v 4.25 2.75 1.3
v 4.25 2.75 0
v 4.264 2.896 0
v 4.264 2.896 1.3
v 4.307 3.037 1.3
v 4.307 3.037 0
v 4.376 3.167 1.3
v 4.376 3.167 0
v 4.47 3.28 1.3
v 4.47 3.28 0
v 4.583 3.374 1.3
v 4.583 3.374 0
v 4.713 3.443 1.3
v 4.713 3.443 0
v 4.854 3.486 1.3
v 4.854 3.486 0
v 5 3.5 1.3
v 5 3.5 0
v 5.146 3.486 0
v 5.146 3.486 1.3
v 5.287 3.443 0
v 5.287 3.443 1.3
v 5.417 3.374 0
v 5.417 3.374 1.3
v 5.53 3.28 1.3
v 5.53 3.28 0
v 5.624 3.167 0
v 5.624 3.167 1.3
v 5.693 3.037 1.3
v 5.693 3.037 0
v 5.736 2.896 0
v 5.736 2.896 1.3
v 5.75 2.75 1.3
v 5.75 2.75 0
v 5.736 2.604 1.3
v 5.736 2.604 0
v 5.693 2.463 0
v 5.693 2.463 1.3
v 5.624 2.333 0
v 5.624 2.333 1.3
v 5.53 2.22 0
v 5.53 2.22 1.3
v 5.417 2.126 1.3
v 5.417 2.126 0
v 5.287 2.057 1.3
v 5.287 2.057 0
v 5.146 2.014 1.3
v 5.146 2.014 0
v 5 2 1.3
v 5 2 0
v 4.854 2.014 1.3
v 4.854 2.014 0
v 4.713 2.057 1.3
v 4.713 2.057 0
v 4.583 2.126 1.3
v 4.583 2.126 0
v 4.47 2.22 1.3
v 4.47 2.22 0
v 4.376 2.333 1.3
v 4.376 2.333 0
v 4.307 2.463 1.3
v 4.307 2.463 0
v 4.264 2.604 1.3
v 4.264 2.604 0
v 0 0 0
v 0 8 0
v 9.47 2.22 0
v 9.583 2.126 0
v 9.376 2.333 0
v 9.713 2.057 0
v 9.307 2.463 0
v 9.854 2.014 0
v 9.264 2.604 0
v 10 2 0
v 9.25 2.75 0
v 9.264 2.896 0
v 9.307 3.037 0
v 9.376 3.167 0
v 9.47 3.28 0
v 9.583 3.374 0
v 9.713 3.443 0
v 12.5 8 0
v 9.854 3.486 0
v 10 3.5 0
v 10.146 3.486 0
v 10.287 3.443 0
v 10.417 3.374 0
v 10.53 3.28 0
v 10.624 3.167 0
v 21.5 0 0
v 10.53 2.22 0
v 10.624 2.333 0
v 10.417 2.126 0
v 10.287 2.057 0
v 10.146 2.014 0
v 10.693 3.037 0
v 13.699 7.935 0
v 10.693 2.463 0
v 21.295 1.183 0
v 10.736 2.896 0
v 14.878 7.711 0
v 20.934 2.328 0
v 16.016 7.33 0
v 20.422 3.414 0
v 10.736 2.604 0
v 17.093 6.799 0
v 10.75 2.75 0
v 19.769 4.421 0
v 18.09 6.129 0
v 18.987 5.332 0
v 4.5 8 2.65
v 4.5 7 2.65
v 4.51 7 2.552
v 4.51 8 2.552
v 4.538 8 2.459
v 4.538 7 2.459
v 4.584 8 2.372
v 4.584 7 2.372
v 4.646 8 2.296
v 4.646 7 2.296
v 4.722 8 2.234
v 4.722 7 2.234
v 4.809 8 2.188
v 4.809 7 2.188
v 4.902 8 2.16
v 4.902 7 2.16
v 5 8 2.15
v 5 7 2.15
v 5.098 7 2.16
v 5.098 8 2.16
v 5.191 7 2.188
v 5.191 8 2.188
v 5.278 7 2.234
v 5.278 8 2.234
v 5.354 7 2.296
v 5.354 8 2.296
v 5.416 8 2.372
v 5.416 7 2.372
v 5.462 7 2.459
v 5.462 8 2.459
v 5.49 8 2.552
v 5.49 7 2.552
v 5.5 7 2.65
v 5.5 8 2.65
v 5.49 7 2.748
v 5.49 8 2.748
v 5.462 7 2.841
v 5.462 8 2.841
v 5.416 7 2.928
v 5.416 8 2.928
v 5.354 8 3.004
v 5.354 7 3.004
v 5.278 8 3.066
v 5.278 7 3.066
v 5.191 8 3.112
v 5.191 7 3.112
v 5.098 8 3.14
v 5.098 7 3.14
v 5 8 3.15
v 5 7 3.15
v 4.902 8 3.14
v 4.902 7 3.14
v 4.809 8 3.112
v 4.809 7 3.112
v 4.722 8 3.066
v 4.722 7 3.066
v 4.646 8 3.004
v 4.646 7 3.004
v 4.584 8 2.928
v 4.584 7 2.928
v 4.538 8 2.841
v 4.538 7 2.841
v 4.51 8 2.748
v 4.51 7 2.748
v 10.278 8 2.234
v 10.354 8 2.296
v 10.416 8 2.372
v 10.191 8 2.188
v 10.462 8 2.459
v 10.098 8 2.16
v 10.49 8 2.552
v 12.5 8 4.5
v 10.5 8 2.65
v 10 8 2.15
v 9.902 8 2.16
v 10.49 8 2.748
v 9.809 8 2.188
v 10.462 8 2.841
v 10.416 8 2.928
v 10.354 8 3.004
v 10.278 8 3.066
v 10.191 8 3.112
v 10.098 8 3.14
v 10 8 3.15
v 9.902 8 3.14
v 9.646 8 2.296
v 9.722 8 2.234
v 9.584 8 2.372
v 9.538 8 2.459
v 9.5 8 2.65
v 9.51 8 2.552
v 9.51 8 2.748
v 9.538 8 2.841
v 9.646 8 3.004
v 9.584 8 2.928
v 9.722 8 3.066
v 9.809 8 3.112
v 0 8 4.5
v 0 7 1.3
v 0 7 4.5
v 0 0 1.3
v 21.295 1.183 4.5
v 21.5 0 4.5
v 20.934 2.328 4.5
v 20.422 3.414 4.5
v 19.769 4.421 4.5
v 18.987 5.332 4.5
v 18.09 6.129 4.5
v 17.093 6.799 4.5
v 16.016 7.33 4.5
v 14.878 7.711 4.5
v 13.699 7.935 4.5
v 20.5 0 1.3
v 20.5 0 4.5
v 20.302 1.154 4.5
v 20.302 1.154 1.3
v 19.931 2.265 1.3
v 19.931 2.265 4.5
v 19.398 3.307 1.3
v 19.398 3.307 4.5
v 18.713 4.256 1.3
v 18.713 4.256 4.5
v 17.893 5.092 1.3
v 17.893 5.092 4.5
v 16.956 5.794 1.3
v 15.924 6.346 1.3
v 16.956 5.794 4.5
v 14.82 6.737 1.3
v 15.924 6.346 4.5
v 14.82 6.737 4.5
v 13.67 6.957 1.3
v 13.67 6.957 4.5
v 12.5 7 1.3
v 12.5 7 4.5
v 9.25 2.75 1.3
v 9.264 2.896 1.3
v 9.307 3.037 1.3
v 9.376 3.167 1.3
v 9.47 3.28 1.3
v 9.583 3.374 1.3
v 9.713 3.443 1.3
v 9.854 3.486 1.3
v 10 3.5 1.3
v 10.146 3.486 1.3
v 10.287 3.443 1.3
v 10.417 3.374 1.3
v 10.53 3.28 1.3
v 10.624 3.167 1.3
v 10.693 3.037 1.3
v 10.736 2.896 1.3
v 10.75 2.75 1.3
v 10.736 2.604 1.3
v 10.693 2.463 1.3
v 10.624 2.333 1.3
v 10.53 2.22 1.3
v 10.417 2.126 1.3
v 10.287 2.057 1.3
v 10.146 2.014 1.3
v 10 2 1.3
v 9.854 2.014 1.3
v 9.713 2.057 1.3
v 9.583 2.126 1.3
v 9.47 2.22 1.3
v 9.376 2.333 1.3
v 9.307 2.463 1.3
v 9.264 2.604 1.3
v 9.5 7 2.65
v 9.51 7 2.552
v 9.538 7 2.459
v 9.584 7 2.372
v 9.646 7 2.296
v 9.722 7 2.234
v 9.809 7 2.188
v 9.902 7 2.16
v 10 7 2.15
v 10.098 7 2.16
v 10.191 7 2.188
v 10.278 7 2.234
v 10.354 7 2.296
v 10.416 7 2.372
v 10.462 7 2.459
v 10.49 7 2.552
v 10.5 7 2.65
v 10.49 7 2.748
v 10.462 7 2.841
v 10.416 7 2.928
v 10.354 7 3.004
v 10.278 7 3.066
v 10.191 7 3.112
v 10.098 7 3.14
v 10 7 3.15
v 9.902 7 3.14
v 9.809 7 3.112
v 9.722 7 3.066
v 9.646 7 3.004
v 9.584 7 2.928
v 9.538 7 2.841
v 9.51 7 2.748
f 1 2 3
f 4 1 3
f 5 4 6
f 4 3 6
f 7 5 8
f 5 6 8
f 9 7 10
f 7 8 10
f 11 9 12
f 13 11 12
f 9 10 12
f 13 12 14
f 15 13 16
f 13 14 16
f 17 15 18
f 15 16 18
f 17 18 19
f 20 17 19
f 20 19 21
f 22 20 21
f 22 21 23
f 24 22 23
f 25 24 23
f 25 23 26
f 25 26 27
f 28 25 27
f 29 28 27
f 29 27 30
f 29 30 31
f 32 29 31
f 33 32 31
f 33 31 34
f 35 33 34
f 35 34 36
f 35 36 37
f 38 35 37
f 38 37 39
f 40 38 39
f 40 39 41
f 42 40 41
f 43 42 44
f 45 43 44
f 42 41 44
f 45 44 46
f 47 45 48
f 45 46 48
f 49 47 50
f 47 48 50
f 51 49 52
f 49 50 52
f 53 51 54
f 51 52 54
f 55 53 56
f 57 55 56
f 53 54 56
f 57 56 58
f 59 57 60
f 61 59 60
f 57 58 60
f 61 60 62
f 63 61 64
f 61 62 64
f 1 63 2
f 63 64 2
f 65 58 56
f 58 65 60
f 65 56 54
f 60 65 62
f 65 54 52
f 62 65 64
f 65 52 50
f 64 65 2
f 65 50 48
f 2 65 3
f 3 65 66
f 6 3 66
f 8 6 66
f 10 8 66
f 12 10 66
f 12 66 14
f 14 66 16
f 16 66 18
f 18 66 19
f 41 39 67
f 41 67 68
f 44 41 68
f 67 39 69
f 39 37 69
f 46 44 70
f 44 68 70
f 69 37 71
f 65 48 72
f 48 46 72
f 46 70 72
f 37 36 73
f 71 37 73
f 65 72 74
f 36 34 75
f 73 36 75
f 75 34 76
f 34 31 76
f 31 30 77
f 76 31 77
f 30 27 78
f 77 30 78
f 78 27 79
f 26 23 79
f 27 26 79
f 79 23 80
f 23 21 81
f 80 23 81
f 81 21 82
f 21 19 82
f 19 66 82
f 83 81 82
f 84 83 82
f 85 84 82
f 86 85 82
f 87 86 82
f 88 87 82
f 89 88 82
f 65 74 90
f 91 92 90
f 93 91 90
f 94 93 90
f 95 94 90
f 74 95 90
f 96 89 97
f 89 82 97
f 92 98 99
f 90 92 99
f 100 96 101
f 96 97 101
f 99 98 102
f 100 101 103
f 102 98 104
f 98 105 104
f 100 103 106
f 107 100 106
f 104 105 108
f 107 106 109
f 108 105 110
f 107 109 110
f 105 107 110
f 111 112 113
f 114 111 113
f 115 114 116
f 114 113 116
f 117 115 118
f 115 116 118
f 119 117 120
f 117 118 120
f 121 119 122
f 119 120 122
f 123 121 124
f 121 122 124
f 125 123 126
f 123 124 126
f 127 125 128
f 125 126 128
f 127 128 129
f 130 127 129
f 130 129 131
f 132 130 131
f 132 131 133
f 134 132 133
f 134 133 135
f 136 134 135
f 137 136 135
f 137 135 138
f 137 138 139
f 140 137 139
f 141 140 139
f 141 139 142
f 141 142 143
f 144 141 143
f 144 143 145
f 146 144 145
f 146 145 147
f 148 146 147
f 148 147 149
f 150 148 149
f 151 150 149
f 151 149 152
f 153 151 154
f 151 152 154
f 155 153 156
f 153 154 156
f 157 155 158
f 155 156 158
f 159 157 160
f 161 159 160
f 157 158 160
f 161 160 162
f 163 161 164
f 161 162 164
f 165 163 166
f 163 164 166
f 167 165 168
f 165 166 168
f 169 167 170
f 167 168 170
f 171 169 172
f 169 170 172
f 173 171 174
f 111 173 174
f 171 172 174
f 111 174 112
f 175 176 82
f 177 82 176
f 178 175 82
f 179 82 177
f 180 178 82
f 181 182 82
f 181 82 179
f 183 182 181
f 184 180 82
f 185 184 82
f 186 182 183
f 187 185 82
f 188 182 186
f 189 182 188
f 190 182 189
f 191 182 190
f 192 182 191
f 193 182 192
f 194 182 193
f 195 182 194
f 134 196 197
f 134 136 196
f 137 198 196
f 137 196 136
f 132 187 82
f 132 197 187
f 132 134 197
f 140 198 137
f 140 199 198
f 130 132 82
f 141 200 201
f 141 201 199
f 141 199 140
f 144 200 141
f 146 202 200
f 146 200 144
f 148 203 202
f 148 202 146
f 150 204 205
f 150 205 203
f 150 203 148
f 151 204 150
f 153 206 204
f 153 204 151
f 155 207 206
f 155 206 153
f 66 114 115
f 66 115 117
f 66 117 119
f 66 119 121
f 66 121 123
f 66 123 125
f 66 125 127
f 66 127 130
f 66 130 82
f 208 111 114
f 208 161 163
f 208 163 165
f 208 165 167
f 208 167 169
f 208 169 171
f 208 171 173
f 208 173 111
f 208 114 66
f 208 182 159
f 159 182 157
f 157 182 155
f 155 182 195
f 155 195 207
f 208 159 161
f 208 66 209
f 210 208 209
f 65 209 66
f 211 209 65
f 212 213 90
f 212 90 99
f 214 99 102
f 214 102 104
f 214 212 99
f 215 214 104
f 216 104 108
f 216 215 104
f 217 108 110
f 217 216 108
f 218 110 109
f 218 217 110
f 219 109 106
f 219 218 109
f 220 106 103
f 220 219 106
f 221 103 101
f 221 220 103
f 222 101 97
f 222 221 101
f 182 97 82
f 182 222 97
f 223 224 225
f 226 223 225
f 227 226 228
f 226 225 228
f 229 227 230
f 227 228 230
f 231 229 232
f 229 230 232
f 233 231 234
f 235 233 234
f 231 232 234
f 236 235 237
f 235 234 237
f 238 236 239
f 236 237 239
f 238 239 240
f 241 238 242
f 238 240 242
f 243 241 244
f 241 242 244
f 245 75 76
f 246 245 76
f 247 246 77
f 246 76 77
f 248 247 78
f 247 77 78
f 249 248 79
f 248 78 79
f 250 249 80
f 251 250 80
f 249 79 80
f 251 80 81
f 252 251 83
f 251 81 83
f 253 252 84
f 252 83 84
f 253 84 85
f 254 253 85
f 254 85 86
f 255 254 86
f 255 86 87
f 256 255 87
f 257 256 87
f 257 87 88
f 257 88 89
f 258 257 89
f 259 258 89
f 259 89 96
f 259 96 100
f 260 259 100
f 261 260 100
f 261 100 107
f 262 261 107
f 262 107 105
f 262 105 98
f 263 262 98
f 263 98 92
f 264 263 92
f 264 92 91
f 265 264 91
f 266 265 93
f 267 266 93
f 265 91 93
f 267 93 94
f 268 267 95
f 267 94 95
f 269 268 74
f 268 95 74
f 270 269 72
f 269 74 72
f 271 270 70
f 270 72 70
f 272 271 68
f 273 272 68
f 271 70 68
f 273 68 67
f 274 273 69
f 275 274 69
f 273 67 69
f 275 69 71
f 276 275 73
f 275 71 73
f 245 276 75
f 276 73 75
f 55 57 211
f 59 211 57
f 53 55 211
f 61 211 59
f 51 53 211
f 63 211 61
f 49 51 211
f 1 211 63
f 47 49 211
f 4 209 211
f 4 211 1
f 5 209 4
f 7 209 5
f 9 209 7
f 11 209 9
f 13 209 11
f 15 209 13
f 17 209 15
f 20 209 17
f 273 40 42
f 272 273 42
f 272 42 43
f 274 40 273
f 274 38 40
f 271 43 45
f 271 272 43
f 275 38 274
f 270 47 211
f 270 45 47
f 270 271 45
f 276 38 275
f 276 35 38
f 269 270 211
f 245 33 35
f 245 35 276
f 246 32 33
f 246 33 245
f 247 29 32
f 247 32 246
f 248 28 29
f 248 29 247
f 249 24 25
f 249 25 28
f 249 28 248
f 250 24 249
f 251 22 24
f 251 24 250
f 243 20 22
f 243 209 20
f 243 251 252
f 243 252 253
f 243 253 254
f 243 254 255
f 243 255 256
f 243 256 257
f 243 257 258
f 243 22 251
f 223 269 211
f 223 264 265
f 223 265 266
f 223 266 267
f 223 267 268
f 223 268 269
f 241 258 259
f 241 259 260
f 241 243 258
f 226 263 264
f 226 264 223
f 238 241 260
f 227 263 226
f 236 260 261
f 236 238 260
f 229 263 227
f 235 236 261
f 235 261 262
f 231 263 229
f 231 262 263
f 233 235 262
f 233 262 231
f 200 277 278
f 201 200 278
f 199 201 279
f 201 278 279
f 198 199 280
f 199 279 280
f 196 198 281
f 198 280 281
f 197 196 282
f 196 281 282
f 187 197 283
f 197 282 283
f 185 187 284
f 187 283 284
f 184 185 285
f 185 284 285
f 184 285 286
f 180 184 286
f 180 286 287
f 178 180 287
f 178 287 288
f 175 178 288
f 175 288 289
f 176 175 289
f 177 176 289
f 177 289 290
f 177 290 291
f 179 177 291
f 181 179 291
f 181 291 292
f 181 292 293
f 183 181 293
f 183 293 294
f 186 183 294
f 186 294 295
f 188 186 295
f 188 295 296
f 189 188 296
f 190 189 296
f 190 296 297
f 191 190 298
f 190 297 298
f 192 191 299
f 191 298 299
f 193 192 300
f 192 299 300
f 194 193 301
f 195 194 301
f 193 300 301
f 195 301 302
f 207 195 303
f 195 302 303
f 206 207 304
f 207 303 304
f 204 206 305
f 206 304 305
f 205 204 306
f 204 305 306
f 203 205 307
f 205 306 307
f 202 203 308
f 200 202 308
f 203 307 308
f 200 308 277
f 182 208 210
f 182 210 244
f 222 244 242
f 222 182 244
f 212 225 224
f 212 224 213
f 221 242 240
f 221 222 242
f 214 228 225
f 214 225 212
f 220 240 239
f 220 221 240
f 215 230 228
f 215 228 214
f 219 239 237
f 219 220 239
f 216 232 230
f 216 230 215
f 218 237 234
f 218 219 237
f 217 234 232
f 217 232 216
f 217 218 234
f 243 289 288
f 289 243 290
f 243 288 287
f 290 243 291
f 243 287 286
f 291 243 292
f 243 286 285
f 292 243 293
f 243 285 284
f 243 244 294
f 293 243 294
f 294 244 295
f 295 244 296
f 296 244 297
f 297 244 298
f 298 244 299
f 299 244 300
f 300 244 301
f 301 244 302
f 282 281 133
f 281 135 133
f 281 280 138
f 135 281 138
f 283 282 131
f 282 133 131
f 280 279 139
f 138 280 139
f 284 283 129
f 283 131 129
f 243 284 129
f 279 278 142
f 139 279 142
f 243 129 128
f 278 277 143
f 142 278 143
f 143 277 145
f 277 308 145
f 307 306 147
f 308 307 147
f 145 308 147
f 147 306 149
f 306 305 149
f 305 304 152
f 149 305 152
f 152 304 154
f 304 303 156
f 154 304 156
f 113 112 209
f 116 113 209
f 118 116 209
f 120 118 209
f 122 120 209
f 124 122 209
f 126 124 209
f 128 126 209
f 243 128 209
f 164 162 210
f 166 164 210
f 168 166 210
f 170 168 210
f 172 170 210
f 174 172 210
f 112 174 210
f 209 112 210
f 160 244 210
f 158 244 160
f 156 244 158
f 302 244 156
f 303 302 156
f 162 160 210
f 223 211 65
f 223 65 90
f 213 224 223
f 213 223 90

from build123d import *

# Parameters (mm, degrees)
SALIENTE_EXTRUIR1_DEPTH           = 4.5
CORTAR_EXTRUIR1_DEPTH             = 3.2
DI_METRO_DE_TALADRO_1_0_1_1_D     = 1
DI_METRO_DE_TALADRO_1_0_1_1_DEPTH = 8
DI_METRO_DE_TALADRO_1_5_1_5_1_D   = 1.5


with BuildPart() as part:
    # Croquis1 → Saliente-Extruir1 (new body)
    with BuildSketch(Plane.XY.offset(4.5)):
        with BuildLine():
            Line((0, 8), (0, 0))
            Line((0, 0), (21.5, 0))
            ThreePointArc((21.5, 0), (18.55160392, 5.74555441), (12.5, 8))
            Line((12.5, 8), (0, 8))
        make_face()
    extrude(amount=-SALIENTE_EXTRUIR1_DEPTH)

    # Croquis2 → Cortar-Extruir1 (cut)
    with BuildSketch(Plane.XY.offset(4.5)):
        with BuildLine():
            Line((12.5, 7), (0, 7))
            Line((0, 7), (0, 0))
            Line((0, 0), (20.5, 0))
            ThreePointArc((20.5, 0), (17.892764807, 5.091731208), (12.5, 7))
        make_face()
    extrude(amount=-CORTAR_EXTRUIR1_DEPTH, mode=Mode.SUBTRACT)

    # Diámetro de taladro Ø1.0 (1)1
    with Locations(Plane(origin=(0, 8, 0), x_dir=(1, 0, 0), z_dir=(0, 1, 0))):
        with Locations((5, -2.65), (10, -2.65)):
            Hole(DI_METRO_DE_TALADRO_1_0_1_1_D / 2, depth=DI_METRO_DE_TALADRO_1_0_1_1_DEPTH)

    # Diámetro de taladro Ø1.5 (1.5)1 (through all)
    with Locations(Plane.XY.offset(1.3)):
        with Locations((10, 2.75), (5, 2.75)):
            Hole(DI_METRO_DE_TALADRO_1_5_1_5_1_D / 2)


solid = part.part
